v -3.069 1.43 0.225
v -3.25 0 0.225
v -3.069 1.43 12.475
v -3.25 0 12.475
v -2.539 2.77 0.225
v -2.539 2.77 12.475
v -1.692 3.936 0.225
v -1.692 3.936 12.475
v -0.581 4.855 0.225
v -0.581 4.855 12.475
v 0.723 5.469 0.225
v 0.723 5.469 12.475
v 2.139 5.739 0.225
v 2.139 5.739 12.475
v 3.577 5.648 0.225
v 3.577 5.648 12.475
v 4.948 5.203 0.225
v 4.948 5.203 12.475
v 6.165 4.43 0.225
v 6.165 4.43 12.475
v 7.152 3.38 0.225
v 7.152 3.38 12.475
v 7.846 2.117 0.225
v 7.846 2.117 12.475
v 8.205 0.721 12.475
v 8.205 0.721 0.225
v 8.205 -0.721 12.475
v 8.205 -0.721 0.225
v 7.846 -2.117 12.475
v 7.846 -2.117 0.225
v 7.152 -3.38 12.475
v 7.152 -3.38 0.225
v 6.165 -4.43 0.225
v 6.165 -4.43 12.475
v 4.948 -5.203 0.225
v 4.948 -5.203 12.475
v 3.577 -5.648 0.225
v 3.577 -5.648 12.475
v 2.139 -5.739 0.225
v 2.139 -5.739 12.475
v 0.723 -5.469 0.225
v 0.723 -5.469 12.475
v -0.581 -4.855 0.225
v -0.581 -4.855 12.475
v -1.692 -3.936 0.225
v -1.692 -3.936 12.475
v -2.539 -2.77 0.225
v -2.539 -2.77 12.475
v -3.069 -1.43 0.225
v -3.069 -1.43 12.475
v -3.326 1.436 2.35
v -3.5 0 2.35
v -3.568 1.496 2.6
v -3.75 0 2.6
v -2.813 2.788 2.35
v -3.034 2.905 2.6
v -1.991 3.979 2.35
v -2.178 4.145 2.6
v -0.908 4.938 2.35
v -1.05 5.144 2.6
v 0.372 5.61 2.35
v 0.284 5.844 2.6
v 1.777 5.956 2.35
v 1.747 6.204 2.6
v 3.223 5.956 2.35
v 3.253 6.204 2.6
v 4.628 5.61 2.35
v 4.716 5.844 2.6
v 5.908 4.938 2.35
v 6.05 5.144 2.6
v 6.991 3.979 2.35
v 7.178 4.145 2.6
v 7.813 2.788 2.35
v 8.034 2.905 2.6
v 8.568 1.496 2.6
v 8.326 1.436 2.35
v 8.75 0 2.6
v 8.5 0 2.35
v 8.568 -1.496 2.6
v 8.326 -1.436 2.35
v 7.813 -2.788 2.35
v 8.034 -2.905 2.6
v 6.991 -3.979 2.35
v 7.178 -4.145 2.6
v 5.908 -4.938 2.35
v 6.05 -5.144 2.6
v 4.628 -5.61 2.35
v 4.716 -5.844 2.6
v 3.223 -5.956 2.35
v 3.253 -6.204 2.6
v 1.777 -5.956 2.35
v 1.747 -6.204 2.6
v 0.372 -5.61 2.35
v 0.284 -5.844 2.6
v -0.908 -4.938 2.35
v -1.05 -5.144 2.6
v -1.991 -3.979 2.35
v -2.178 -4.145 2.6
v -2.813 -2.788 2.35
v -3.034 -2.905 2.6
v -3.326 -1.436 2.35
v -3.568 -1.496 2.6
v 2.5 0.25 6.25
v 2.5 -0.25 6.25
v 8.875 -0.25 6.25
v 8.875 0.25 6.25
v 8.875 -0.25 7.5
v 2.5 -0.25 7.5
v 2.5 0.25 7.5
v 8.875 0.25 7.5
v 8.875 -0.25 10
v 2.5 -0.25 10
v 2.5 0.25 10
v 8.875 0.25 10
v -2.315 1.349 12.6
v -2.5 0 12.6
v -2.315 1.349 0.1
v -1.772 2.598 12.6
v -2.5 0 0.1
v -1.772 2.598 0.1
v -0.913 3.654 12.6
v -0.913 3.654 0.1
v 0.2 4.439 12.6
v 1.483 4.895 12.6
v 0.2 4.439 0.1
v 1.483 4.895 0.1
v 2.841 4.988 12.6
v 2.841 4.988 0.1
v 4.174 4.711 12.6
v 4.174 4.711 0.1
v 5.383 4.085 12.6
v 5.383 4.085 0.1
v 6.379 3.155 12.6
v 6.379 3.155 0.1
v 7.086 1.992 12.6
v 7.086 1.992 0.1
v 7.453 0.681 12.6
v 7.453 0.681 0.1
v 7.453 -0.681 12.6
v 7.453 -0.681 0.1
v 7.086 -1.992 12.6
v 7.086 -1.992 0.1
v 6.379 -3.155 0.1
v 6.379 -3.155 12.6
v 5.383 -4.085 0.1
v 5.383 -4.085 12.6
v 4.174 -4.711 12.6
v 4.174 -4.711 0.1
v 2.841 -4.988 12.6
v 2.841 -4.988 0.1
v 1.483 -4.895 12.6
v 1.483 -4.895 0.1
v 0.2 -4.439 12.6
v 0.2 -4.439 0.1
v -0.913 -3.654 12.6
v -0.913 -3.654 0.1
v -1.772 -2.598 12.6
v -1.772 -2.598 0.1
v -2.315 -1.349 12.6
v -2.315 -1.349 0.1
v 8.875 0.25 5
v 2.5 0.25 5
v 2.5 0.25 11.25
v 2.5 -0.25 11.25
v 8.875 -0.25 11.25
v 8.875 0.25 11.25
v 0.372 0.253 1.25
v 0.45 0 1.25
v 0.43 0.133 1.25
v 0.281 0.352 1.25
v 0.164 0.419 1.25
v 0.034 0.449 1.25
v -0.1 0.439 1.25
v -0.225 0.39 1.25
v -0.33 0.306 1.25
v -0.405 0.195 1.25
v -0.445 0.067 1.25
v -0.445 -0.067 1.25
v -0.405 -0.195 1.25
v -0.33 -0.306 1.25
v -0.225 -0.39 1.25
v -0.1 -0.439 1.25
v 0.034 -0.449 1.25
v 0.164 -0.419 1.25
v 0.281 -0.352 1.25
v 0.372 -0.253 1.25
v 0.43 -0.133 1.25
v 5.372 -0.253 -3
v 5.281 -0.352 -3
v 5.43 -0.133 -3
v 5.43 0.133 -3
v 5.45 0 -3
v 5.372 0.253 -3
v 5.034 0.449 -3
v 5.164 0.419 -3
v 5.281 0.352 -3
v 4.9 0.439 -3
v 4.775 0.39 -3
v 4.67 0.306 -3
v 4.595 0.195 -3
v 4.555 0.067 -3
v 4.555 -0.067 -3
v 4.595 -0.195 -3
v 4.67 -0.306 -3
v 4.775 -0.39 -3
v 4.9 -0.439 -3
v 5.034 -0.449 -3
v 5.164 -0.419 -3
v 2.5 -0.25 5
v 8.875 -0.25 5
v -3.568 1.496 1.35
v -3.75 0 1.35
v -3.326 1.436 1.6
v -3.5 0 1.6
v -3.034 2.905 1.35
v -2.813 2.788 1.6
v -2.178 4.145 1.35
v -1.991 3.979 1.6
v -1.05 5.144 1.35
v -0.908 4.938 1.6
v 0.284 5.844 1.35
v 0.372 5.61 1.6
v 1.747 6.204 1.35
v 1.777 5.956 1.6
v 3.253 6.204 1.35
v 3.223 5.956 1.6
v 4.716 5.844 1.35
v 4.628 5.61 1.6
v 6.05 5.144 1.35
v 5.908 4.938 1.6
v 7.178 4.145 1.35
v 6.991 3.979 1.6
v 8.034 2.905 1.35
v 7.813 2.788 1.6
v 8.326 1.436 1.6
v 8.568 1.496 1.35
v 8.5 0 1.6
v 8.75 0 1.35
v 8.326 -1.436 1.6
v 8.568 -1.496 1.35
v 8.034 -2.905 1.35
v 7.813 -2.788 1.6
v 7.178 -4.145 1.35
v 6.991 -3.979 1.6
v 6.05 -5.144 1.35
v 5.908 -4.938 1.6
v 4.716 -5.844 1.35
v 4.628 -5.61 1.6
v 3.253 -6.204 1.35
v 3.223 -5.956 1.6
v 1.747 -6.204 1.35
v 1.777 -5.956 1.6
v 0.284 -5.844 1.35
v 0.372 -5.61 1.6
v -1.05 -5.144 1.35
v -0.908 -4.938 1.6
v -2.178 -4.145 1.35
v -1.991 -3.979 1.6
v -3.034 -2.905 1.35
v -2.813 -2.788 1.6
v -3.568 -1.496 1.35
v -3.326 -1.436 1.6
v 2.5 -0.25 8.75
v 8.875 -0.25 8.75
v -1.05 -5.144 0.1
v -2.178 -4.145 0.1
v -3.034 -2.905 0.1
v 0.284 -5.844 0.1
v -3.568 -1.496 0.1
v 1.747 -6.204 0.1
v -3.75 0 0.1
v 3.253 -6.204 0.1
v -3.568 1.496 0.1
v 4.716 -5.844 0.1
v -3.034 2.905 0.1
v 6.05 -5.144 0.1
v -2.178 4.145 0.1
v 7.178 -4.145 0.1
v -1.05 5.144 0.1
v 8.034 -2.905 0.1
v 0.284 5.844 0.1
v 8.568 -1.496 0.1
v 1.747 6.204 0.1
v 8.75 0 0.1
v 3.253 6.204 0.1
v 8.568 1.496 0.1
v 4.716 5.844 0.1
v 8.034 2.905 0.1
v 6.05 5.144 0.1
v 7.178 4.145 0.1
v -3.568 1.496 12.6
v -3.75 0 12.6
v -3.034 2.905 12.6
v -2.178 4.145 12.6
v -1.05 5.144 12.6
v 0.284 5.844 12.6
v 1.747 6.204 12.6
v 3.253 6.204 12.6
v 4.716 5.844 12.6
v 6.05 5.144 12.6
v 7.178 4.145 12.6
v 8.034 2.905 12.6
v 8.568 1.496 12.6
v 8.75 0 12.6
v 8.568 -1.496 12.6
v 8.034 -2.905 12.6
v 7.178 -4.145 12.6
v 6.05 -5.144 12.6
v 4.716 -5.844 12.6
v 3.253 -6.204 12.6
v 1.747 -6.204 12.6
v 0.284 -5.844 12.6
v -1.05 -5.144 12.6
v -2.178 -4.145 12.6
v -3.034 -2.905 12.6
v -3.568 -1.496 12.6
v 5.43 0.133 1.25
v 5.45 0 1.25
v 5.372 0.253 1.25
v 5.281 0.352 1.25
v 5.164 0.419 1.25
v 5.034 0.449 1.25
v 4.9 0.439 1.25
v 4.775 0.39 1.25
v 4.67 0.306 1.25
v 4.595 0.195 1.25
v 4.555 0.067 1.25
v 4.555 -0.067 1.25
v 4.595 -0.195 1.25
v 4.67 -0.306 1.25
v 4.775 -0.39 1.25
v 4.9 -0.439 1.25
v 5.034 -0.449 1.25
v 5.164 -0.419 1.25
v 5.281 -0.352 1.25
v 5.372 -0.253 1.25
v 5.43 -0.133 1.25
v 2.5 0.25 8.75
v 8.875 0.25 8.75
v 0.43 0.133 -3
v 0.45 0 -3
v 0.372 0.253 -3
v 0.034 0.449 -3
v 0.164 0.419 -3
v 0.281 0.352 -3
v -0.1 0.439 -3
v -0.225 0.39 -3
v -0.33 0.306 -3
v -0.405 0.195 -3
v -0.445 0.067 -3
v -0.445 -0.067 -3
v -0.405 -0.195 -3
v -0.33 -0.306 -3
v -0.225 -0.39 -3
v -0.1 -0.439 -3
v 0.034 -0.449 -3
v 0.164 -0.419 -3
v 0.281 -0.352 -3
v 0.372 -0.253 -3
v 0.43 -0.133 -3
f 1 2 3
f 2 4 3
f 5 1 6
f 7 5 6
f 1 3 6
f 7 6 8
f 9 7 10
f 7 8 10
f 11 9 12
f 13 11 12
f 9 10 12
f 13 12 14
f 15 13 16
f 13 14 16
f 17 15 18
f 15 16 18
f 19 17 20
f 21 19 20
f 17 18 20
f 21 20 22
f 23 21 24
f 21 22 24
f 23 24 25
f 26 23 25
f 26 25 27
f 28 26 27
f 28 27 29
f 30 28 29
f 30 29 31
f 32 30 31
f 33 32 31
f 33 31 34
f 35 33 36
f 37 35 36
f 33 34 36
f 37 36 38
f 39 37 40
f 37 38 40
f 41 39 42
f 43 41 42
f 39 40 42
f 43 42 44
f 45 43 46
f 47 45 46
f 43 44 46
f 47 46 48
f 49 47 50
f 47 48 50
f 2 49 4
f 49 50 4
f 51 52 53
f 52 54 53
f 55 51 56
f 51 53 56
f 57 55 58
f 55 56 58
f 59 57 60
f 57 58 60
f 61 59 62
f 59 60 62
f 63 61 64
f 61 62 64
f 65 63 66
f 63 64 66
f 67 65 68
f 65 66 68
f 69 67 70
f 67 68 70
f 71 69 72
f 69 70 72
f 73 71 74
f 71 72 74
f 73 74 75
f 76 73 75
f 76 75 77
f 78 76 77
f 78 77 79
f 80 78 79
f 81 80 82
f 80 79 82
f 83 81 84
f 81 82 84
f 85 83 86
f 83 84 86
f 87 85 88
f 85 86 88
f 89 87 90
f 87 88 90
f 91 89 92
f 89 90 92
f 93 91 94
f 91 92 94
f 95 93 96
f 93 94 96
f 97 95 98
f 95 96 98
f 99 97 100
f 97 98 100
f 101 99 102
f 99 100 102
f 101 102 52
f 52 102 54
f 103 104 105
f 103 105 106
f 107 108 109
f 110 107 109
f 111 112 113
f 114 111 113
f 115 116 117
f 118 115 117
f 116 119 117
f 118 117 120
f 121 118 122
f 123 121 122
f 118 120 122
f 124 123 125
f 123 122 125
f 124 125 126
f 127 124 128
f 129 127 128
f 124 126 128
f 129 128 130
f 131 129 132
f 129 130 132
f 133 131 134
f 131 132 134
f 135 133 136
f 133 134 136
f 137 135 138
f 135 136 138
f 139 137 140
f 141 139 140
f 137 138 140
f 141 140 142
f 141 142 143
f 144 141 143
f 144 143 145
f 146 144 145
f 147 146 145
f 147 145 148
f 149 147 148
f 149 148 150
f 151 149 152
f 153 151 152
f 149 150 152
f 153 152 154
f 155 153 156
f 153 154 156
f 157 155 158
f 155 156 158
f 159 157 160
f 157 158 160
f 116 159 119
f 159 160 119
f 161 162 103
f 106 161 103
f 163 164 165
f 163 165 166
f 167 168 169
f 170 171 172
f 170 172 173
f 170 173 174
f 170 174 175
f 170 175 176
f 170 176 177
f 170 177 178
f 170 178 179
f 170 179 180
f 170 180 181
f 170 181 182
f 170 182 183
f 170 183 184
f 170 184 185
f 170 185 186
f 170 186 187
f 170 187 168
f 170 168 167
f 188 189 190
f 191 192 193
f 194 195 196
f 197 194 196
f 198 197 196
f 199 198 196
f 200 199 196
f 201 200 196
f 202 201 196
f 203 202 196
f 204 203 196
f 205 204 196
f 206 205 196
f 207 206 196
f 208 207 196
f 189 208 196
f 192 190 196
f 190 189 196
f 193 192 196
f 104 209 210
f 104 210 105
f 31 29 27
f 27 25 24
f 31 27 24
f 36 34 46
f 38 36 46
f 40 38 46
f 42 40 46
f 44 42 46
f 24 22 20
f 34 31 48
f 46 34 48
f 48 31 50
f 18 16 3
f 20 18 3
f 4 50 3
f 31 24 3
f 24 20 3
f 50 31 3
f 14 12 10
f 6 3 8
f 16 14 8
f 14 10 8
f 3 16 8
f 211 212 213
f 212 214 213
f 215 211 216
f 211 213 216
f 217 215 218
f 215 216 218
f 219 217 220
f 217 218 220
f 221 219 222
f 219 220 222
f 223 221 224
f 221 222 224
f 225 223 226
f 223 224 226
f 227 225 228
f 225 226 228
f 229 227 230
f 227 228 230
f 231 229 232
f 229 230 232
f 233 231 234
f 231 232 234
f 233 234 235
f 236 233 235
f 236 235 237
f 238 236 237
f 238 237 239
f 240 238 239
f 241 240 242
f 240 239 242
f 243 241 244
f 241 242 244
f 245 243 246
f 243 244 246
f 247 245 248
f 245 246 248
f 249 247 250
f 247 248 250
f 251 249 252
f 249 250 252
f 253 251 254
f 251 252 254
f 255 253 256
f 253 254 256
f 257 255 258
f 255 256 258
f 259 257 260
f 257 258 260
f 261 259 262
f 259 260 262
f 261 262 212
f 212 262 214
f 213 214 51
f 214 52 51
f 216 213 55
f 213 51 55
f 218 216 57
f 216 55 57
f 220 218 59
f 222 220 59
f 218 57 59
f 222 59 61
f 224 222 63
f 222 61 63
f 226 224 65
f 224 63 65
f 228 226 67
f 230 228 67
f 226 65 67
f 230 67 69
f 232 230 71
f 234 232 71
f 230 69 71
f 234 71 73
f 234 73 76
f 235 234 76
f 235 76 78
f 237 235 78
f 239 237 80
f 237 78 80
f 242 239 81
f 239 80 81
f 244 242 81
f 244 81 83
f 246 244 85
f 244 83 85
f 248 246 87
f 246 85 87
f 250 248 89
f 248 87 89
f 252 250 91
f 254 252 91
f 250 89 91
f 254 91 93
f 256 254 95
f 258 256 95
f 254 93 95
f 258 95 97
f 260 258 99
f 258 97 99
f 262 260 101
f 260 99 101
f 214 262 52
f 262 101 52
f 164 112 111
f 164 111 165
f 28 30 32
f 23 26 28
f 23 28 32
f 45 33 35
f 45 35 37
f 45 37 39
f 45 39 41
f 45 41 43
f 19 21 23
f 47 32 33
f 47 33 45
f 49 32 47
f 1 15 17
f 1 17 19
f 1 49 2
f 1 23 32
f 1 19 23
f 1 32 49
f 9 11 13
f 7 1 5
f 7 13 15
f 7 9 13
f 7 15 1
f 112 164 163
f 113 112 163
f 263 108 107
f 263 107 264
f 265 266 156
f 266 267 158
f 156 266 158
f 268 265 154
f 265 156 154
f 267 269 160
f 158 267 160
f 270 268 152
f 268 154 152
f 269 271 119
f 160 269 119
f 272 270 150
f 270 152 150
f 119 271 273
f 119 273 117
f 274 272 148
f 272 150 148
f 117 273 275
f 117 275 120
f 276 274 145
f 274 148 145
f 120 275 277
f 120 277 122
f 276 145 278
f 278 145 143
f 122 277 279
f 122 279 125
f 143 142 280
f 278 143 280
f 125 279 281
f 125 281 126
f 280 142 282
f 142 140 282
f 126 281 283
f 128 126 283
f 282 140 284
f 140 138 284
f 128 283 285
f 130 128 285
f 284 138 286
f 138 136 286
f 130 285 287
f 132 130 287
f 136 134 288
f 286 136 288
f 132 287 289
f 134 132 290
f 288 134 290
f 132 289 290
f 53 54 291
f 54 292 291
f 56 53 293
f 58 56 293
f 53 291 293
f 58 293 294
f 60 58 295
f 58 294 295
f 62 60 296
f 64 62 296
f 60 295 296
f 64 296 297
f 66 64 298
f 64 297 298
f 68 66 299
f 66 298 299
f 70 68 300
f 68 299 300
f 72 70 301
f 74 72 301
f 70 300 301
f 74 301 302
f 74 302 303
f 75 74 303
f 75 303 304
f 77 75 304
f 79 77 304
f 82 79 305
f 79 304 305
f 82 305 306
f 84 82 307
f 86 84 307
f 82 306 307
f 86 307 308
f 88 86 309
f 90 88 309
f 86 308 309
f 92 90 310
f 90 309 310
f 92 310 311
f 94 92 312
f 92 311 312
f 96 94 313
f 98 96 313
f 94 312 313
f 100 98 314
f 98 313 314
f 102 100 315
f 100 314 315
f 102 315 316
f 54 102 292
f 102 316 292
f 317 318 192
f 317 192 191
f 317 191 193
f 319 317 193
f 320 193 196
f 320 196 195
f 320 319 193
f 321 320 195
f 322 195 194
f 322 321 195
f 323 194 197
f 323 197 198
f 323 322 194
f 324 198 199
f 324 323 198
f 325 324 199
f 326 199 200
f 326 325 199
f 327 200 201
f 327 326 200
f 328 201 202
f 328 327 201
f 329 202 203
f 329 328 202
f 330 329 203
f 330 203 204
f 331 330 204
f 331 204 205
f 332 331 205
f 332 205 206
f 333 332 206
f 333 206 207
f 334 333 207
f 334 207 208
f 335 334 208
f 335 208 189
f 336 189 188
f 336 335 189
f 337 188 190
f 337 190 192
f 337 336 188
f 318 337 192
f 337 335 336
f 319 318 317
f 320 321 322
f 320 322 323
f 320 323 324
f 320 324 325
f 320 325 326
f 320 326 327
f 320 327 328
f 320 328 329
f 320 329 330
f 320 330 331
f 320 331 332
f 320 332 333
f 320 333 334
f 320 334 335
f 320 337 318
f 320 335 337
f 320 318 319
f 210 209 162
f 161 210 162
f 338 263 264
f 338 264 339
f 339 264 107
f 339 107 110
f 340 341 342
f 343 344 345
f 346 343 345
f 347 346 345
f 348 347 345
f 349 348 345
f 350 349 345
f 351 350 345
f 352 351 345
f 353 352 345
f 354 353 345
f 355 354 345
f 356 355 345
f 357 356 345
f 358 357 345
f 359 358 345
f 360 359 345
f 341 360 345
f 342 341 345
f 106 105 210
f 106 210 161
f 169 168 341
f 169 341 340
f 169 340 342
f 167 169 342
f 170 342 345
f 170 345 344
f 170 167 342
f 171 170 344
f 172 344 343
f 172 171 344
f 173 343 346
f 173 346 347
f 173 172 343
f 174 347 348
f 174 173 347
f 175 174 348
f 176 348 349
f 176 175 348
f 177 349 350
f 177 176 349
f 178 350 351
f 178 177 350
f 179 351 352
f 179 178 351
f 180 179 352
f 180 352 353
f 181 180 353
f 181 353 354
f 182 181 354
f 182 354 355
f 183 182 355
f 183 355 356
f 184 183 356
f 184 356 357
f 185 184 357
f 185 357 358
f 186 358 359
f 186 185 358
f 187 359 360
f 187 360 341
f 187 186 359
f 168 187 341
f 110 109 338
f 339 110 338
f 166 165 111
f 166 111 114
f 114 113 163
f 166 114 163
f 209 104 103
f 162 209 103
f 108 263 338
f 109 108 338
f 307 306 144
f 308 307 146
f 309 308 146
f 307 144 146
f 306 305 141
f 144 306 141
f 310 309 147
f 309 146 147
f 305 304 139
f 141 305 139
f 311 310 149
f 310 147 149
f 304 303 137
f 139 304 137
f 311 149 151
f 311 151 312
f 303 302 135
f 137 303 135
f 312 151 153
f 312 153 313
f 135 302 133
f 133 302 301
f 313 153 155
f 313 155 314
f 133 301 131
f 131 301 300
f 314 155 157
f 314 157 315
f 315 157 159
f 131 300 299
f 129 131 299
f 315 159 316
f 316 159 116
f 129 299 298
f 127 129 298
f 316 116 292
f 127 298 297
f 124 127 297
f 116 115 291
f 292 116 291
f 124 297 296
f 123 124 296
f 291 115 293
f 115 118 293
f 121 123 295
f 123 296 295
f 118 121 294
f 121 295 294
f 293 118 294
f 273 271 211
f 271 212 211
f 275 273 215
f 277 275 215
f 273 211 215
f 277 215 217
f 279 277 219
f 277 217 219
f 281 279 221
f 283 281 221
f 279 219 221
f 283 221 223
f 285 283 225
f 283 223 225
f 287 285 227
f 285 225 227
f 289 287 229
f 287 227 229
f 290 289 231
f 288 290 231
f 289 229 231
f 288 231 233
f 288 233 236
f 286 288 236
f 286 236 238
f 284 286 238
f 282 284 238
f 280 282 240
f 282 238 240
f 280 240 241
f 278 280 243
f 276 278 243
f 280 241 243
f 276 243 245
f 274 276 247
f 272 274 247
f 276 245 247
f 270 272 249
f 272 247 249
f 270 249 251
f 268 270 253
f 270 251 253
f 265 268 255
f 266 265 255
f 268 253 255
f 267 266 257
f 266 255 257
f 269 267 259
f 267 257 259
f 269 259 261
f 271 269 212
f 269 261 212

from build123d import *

# Parameters (mm, degrees)
SKETCH002_W  = 5.75
SKETCH002_H  = 12.25
SKETCH003_R  = 0.45
PAD_DEPTH    = 4.25
SKETCH004_W  = 0.5
SKETCH004_H  = 1.25
PAD001_DEPTH = 6.375


with BuildPart() as revolution:
    # Sketch → Revolution (revolve)
    with BuildSketch(Plane.XZ):
        Polygon((-3.75, 0.1), (-3.75, 1.35), (-3.5, 1.6), (-3.5, 2.35), (-3.75, 2.6), (-3.75, 12.6), (-2.5, 12.6), (-2.5, 0.1), align=None)
    revolve(axis=Axis((2.5, 0, 7.548619), (0, 0, -1)))


with BuildPart() as revolution001:
    # Sketch002 → Revolution001 (revolve)
    with BuildSketch(Plane.XZ):
        with Locations((-0.375, 6.35)):
            Rectangle(SKETCH002_W, SKETCH002_H)
    revolve(axis=Axis((2.5, 0, 4.680116), (0, 0, -1)))


with BuildPart() as pad:
    # Sketch003 → Pad (new body)
    with BuildSketch(Plane.XY.offset(1.25)):
        Circle(SKETCH003_R)
        with Locations((5, 0)):
            Circle(SKETCH003_R)
    extrude(amount=-PAD_DEPTH)


with BuildPart() as pad001:
    # Sketch004 → Pad001 (new body)
    with BuildSketch(Plane.YZ.offset(2.5)):
        with Locations((0, 5.625)):
            Rectangle(SKETCH004_W, SKETCH004_H)
        with Locations((0, 8.125)):
            Rectangle(SKETCH004_W, SKETCH004_H)
        with Locations((0, 10.625)):
            Rectangle(SKETCH004_W, SKETCH004_H)
    extrude(amount=PAD001_DEPTH)


solid = Compound([revolution.part, revolution001.part, pad.part, pad001.part])
